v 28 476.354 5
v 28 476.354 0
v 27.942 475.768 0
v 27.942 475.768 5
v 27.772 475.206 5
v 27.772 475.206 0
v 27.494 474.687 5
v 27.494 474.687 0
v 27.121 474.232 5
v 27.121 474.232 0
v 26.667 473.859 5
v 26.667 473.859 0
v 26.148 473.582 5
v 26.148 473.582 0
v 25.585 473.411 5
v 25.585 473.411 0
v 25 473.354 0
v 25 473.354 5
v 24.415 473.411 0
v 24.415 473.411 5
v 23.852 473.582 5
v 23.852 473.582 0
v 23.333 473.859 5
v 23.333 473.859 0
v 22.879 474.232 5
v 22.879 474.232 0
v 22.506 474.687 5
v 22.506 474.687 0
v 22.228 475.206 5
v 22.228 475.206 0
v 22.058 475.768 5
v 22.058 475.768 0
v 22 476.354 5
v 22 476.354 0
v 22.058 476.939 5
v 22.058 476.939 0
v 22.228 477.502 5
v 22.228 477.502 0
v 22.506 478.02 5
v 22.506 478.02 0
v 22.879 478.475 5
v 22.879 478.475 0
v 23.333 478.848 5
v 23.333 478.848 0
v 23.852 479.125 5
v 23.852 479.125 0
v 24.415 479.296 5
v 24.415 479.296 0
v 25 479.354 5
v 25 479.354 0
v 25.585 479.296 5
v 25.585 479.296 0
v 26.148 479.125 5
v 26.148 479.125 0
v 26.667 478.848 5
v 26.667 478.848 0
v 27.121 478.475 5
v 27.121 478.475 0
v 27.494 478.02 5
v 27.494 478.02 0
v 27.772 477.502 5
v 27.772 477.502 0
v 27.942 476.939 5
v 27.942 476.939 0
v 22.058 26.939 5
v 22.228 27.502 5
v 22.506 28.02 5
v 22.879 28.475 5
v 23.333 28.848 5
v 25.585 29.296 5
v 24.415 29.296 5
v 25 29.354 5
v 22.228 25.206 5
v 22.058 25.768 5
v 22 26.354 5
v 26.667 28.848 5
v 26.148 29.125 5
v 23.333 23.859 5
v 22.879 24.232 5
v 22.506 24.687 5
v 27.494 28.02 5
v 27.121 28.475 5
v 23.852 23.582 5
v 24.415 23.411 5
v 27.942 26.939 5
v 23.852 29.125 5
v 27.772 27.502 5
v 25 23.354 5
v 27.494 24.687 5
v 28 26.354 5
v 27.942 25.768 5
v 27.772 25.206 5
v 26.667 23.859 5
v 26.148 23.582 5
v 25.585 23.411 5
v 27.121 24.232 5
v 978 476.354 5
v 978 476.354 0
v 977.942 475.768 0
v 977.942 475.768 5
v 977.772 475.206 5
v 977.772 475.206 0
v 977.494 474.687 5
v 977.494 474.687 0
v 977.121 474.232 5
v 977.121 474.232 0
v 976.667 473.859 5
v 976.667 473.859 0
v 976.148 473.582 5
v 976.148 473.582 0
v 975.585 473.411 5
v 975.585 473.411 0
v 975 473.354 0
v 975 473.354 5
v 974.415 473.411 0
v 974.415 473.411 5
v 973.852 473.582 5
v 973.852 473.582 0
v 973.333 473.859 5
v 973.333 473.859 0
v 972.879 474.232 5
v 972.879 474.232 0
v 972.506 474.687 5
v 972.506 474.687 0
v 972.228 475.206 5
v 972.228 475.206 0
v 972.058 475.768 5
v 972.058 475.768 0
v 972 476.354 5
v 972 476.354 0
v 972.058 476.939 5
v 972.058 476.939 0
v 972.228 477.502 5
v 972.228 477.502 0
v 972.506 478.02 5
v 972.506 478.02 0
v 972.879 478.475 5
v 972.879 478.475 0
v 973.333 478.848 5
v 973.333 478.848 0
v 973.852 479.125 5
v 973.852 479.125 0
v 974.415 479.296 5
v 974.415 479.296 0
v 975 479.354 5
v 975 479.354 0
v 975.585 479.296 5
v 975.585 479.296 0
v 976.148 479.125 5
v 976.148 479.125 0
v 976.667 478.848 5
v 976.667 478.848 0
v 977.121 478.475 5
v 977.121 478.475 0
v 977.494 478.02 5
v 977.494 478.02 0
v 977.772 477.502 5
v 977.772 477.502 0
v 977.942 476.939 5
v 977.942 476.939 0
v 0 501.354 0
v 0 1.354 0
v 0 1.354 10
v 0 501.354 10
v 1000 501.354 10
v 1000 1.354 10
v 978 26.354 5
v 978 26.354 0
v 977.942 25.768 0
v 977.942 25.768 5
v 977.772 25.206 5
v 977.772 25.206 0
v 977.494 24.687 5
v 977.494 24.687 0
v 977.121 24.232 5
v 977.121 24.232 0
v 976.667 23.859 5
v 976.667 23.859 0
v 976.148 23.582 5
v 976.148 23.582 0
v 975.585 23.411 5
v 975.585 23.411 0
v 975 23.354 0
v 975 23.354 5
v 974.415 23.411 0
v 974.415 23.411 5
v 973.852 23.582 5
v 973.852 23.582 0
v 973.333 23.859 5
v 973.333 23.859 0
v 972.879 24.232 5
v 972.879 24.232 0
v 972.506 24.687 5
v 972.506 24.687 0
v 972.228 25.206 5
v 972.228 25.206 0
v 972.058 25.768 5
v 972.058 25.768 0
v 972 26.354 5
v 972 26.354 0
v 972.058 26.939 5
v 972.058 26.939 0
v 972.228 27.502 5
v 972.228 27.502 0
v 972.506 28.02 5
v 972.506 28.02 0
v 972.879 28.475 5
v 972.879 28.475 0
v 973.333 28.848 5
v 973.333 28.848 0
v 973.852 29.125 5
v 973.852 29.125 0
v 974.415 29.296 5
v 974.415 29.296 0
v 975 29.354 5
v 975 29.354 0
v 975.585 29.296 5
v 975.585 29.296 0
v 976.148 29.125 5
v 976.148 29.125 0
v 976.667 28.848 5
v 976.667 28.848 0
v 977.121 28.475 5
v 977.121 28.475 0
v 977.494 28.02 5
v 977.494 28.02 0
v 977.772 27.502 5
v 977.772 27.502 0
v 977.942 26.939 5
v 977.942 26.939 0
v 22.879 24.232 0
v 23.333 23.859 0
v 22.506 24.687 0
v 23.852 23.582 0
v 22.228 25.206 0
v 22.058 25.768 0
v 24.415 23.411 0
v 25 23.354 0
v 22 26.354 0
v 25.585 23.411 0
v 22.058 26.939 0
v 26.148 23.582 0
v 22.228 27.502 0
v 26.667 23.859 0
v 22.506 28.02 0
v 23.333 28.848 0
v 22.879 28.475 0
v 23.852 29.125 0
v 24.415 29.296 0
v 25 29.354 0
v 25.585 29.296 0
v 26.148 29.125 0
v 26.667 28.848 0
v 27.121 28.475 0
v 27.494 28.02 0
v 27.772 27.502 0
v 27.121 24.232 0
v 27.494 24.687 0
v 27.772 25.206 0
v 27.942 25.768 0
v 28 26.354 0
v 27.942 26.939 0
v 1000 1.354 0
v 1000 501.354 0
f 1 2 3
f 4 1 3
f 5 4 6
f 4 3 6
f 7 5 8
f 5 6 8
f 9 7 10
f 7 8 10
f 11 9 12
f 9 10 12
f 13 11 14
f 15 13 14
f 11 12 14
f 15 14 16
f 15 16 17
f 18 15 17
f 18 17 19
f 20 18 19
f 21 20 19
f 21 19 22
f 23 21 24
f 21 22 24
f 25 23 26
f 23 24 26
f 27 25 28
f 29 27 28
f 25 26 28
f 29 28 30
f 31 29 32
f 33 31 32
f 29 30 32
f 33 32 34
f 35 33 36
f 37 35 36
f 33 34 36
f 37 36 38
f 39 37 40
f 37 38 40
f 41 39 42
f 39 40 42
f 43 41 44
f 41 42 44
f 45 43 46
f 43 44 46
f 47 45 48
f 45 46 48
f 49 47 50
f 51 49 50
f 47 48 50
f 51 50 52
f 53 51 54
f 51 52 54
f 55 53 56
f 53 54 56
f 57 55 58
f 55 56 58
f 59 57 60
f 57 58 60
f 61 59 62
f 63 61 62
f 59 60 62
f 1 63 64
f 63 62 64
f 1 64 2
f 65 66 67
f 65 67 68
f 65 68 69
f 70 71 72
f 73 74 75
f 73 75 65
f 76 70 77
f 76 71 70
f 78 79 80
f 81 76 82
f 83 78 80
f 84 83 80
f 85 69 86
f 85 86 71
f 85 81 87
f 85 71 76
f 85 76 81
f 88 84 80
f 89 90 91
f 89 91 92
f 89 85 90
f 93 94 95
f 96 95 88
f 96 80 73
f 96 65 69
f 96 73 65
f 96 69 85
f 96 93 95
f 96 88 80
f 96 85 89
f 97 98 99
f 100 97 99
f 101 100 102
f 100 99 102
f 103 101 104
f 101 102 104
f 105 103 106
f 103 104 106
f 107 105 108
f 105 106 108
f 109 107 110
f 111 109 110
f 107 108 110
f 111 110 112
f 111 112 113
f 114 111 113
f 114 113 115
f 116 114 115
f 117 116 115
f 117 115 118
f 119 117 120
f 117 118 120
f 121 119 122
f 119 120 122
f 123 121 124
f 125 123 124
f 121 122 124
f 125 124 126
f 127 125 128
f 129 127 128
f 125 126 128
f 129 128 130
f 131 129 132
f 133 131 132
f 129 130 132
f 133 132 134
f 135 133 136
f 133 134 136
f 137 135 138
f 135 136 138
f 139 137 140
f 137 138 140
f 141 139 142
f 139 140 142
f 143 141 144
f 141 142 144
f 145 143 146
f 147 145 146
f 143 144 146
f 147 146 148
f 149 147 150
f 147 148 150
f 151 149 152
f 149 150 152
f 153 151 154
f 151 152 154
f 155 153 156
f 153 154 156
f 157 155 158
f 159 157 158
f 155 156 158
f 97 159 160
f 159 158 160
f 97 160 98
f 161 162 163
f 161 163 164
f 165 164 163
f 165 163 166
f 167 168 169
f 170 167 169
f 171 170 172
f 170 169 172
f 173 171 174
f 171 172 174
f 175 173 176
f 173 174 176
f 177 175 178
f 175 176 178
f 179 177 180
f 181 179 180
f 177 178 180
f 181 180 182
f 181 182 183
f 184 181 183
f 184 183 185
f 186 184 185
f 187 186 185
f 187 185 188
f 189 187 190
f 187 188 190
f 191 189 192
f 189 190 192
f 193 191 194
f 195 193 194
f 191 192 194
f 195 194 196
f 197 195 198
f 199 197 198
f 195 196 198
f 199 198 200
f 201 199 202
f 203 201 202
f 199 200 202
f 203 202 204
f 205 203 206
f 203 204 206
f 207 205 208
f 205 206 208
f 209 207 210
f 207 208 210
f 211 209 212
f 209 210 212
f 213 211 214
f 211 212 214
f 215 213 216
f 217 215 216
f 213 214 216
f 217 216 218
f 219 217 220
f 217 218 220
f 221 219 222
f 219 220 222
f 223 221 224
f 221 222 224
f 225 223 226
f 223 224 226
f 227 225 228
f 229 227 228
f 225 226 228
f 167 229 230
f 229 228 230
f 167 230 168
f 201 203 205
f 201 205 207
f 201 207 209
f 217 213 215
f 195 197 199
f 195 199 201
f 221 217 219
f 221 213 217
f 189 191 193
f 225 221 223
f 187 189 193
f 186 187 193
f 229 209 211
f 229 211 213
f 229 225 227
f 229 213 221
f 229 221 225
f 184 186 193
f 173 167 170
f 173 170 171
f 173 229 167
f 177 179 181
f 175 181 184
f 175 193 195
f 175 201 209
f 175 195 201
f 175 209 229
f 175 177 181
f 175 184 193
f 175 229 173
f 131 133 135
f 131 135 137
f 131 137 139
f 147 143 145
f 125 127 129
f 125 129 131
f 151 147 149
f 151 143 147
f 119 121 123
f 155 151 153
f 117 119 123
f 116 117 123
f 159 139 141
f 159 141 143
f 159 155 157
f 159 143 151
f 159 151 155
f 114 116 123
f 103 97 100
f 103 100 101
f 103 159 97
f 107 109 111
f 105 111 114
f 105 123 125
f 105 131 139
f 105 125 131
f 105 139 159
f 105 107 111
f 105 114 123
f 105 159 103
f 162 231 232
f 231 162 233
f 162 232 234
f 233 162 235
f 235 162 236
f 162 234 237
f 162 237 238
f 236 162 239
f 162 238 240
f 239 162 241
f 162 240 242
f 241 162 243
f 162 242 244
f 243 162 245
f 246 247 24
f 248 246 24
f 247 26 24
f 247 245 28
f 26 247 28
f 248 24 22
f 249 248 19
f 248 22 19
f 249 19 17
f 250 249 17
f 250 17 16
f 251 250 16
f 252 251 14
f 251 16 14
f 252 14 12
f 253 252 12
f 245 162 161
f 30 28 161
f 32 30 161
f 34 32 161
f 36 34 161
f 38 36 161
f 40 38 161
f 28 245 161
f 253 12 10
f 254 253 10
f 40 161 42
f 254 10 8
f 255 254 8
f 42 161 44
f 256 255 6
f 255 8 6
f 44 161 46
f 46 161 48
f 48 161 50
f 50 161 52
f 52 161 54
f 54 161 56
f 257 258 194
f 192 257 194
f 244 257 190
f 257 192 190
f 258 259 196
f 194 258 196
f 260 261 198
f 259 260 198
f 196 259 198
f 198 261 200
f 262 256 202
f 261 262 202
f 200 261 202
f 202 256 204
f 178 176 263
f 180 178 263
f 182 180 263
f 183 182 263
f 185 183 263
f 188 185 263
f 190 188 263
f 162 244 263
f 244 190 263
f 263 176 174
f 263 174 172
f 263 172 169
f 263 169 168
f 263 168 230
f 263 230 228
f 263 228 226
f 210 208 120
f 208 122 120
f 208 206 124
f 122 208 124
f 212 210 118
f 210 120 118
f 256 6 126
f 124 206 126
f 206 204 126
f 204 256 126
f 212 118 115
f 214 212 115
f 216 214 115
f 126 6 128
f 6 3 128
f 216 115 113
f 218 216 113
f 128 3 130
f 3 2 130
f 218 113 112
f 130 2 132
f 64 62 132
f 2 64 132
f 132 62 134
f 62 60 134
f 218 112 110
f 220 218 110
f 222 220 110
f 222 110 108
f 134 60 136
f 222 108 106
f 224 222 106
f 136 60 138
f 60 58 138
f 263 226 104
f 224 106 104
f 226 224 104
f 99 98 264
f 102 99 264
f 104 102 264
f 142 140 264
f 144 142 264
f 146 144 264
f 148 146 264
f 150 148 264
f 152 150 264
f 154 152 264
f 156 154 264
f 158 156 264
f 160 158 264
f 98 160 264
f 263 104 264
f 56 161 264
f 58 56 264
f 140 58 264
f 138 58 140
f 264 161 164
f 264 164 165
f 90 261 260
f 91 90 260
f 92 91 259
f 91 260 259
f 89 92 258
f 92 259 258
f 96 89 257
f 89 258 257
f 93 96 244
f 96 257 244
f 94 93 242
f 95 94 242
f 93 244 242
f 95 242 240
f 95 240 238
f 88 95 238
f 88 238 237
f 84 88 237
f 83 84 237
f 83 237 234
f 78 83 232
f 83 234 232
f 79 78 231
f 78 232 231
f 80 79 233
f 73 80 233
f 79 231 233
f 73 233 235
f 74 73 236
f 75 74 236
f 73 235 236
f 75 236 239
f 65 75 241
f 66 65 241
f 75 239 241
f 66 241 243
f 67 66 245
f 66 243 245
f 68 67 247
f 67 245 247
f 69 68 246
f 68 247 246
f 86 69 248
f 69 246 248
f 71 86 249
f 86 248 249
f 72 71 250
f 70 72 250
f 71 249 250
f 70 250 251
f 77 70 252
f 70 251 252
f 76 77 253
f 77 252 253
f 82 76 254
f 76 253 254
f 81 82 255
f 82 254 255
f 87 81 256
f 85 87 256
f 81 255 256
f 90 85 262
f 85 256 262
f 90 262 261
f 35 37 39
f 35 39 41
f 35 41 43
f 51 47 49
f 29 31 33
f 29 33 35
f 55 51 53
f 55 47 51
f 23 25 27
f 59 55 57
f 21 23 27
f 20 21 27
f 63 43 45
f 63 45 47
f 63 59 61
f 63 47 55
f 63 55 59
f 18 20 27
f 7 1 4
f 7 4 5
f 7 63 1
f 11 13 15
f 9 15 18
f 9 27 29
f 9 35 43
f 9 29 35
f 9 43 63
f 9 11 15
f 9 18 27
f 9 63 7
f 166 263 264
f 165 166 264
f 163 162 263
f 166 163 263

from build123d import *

# Parameters (mm, degrees)
F0_W     = 1000
F0_H     = 500
F1_DEPTH = 10
F2_R     = 3
F3_DEPTH = 5
F4_DEPTH = 5
F5_DEPTH = 5


with BuildPart() as f1:
    # F0 (on Top) → F1 (new body)
    with BuildSketch(Plane.XY):
        with Locations((500, 251.353577)):
            Rectangle(F0_W, F0_H)
    extrude(amount=F1_DEPTH)

    # F2 (on face) → F3 (cut)
    with BuildSketch(Plane(origin=(0, 0, 0), x_dir=(1, 0, 0), z_dir=(0, 0, -1))):
        with Locations((25, -26.353577)):
            Circle(F2_R)
    extrude(amount=-F3_DEPTH, mode=Mode.SUBTRACT)

    # F2 (on face) → F4 (cut)
    with BuildSketch(Plane(origin=(0, 0, 0), x_dir=(1, 0, 0), z_dir=(0, 0, -1))):
        with Locations((25, -476.353577)):
            Circle(F2_R)
    extrude(amount=-F4_DEPTH, mode=Mode.SUBTRACT)

    # F2 (on face) → F5 (cut)
    with BuildSketch(Plane(origin=(0, 0, 0), x_dir=(1, 0, 0), z_dir=(0, 0, -1))):
        with Locations((25, -26.353577)):
            Circle(F2_R)
        with Locations((25, -476.353577)):
            Circle(F2_R)
        with Locations((975, -26.353577)):
            Circle(F2_R)
        with Locations((975, -476.353577)):
            Circle(F2_R)
    extrude(amount=-F5_DEPTH, mode=Mode.SUBTRACT)


solid = f1.part
